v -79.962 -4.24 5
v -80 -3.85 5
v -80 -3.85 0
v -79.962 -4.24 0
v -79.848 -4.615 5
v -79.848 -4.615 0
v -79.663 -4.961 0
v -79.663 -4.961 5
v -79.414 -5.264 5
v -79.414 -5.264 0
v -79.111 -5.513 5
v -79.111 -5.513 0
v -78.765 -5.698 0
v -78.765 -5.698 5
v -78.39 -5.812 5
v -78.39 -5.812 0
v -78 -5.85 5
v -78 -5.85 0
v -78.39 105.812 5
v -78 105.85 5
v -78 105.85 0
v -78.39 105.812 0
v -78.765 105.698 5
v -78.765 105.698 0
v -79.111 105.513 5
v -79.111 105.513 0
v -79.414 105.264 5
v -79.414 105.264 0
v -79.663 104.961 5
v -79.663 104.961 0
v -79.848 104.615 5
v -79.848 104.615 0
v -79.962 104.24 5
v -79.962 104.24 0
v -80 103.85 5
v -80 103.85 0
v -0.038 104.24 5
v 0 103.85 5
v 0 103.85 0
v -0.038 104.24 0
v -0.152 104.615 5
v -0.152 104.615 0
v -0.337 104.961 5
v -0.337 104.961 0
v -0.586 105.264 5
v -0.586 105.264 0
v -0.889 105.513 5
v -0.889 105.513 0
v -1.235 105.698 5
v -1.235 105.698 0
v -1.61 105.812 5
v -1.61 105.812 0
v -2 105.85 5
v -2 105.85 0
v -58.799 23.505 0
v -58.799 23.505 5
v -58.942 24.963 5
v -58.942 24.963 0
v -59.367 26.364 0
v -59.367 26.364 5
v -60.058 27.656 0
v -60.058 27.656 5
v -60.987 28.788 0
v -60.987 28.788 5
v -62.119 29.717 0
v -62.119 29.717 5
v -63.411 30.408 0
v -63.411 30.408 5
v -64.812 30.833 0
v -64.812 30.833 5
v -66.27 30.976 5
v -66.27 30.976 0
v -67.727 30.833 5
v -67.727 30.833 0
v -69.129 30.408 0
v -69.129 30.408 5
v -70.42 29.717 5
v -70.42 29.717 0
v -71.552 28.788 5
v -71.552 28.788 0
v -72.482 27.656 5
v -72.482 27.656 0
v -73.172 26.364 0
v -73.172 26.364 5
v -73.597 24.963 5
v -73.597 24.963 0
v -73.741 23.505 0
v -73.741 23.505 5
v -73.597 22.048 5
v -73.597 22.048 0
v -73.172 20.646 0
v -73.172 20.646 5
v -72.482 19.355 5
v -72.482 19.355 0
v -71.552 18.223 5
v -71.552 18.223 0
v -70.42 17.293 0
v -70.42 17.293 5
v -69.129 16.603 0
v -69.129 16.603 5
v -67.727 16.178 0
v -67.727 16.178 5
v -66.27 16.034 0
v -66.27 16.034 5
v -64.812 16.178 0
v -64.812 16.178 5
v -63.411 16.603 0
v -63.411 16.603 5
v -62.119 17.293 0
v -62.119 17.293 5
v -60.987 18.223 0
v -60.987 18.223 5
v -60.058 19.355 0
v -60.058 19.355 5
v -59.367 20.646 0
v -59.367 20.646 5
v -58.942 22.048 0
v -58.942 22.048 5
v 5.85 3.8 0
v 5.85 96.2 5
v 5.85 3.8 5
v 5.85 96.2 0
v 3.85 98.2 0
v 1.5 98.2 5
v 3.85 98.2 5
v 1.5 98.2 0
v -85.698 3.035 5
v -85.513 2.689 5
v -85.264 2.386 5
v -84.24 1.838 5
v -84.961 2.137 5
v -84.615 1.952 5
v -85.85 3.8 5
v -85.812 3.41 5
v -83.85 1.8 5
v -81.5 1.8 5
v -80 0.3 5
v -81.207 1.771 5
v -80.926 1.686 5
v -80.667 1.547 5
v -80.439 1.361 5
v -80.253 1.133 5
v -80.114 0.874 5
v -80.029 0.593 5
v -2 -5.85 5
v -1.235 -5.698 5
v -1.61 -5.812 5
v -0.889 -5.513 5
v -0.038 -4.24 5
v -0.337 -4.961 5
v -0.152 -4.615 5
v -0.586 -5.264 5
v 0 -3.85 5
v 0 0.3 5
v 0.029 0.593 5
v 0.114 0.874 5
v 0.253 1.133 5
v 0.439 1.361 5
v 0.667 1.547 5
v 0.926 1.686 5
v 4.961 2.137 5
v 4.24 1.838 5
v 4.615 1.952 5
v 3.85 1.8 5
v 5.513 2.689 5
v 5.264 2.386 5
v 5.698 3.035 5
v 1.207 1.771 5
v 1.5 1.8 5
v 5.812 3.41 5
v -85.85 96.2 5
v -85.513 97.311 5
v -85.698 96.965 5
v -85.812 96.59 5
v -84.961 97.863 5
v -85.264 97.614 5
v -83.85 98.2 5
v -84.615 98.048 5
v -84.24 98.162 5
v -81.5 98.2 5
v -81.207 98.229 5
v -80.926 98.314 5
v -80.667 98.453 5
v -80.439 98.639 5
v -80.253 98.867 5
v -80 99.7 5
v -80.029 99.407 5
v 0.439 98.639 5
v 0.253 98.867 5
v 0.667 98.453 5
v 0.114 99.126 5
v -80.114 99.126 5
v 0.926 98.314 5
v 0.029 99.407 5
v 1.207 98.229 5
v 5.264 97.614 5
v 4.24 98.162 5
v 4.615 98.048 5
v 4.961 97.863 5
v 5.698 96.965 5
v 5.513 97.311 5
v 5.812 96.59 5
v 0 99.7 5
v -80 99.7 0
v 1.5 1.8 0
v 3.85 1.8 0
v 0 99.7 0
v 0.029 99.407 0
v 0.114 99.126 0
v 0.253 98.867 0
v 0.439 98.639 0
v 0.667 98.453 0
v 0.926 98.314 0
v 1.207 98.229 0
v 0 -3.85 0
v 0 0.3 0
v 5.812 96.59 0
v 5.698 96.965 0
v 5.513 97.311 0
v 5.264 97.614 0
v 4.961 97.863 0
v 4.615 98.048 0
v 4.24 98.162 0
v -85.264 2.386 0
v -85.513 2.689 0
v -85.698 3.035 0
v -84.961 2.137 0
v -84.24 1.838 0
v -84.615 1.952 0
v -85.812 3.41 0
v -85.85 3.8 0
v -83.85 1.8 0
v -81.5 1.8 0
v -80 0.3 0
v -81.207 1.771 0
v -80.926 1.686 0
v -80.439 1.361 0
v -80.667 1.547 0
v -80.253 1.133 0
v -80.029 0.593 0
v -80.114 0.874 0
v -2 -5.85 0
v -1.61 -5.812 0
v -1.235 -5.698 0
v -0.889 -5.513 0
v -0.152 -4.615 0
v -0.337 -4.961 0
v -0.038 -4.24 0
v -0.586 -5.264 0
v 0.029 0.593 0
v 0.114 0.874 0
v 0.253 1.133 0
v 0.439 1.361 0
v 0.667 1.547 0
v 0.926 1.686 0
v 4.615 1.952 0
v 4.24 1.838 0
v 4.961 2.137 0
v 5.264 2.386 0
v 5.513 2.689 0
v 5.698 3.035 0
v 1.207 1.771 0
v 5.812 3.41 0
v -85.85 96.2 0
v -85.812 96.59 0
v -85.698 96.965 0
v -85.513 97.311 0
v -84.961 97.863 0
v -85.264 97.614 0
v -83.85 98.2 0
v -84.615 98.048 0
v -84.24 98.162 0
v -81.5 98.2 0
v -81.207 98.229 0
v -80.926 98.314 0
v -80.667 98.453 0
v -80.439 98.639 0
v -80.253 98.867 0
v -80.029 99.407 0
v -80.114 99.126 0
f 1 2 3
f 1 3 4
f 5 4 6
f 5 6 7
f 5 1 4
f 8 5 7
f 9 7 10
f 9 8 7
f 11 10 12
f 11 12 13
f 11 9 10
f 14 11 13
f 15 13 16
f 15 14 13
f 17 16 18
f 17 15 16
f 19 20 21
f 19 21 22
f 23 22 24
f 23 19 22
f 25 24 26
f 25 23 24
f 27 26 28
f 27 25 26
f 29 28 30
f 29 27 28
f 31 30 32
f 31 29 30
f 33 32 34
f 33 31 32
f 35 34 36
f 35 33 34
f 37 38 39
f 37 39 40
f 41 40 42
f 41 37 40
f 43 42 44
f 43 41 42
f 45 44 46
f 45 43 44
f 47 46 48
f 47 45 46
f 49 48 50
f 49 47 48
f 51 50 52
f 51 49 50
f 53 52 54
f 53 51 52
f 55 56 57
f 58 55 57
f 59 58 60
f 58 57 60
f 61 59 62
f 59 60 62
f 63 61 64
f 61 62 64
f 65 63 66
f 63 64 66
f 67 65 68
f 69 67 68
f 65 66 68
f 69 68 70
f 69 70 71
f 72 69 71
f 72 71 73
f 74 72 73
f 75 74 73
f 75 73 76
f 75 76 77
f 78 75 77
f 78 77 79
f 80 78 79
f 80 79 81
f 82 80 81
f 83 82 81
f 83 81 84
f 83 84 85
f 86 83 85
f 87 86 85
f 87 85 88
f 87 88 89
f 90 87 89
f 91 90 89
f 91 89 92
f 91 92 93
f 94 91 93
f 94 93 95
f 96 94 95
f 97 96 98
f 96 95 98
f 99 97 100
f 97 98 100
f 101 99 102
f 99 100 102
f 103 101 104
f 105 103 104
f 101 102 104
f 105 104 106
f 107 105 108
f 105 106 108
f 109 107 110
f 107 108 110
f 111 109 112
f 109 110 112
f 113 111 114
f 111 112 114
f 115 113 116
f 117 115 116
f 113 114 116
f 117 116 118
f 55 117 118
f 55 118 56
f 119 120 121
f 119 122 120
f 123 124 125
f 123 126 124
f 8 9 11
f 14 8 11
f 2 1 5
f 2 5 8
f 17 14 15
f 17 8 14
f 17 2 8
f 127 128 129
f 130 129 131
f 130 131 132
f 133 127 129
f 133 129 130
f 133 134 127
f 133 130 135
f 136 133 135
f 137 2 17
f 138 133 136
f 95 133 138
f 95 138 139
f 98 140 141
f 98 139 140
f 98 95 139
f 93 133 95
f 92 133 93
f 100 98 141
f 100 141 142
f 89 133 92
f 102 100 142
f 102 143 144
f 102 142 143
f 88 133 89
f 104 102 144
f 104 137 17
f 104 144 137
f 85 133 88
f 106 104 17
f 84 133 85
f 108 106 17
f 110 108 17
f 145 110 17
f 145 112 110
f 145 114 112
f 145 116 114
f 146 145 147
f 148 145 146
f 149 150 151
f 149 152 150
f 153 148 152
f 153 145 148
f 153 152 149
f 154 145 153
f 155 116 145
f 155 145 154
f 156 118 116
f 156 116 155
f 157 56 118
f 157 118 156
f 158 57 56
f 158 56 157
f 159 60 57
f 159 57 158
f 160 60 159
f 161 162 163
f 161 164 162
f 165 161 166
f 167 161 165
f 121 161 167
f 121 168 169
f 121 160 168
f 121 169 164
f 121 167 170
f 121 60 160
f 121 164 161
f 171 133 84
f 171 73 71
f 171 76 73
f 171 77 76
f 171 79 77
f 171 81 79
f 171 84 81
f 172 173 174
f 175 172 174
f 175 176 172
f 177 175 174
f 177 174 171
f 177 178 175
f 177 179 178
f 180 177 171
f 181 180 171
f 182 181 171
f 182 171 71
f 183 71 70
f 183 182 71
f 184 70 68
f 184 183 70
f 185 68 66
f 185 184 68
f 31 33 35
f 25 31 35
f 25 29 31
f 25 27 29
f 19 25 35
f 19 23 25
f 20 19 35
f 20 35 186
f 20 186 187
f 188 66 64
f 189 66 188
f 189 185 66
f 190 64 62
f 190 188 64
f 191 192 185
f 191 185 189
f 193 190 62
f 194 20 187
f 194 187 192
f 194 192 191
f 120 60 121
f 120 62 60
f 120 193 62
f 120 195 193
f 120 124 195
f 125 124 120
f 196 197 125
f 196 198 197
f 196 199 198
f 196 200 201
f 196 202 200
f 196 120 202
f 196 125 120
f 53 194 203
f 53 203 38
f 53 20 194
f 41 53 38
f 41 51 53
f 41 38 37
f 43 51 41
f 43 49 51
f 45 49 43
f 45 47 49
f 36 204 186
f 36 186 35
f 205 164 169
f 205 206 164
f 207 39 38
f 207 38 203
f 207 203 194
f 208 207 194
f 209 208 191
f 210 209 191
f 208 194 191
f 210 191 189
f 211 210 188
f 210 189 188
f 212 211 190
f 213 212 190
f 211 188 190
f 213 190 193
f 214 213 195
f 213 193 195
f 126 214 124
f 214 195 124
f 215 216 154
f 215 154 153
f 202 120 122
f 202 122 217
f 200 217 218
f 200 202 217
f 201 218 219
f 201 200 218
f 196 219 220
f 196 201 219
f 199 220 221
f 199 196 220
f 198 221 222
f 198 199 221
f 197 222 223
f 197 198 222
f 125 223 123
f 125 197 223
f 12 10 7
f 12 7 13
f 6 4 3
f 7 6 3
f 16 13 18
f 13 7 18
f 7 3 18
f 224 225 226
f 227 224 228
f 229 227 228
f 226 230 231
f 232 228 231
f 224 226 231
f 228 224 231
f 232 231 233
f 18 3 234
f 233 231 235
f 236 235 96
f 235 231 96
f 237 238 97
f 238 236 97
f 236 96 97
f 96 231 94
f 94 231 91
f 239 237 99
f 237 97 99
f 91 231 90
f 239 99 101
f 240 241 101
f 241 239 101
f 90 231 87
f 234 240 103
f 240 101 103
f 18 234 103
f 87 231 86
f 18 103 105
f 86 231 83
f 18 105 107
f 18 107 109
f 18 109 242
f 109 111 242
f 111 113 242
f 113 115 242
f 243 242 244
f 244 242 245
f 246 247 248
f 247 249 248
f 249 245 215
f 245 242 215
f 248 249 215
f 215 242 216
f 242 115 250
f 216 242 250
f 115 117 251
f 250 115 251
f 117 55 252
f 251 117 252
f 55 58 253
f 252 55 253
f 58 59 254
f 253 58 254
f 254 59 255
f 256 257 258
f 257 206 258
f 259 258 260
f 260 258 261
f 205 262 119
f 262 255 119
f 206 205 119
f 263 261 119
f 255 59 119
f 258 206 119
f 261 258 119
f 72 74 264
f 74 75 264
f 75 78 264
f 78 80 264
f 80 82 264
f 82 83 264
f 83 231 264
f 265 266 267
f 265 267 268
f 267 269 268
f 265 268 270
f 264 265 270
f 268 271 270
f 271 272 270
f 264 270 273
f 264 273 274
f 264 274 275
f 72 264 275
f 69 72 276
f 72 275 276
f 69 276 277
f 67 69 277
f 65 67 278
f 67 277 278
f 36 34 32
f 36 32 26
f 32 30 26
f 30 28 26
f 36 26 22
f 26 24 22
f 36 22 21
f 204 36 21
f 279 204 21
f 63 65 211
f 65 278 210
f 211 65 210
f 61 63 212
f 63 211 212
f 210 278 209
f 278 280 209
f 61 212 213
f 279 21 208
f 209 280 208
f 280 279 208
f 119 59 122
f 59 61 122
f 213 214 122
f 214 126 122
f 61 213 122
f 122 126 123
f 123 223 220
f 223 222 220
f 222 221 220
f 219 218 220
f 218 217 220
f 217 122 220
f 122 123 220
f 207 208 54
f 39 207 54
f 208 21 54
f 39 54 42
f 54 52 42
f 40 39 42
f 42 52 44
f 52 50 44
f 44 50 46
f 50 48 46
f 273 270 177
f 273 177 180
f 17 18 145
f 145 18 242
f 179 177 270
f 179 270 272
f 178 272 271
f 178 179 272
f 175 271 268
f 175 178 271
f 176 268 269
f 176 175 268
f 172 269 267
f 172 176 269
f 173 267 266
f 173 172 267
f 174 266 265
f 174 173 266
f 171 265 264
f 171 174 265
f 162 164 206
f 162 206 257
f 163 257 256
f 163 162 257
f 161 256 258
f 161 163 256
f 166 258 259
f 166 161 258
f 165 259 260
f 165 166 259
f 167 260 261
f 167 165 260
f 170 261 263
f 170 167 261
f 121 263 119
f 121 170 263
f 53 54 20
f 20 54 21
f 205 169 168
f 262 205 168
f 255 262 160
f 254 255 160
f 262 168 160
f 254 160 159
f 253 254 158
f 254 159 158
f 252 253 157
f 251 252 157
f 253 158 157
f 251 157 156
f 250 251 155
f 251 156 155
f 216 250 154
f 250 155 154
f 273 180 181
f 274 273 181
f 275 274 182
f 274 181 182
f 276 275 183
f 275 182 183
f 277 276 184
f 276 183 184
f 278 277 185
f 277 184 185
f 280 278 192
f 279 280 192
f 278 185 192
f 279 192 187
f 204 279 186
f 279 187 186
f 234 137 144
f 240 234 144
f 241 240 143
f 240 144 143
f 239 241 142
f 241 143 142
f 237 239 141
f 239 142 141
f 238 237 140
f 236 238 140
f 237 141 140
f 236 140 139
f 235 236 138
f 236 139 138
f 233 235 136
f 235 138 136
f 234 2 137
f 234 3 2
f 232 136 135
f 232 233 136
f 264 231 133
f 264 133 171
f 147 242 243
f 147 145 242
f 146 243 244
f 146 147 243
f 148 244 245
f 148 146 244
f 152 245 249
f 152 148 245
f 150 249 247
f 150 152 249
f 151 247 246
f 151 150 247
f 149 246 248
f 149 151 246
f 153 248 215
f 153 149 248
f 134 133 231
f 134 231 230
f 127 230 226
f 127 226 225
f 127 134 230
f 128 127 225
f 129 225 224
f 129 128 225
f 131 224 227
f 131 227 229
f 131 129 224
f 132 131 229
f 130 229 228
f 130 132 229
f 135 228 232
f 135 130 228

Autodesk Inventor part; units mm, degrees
ref_plane "YZ Plane" through (0, 0, 0) normal (1, 0, 0) x (0, 1, 0)
ref_plane "XZ Plane" through (0, 0, 0) normal (0, 1, 0) x (-1, 0, 0)
ref_plane "XY Plane" through (0, 0, 0) normal (0, 0, 1) x (1, 0, 0)
sketch "Skizze3" plane through (0, 0, 0) normal (0, 0, 1) x (1, 0, 0)
  line L0 (0, 0) -> (-80, 0)
  line L1 (-80, 0) -> (-80, 100)
  line L2 (-80, 100) -> (0, 100)
  line L3 (0, 100) -> (0, 0)
  line L4 (-80, 100) -> (0, 100)
  line L5 (-40, 105.85) -> (-80, 105.85)
  line L6 (-80, 105.85) -> (-80, 100)
  line L7 (-80, 50) -> (-85.85, 50)
  line L8 (-85.85, 50) -> (-85.85, 98.2)
  line L9 (-85.85, 98.2) -> (-80, 98.2)
  line L10 (-80, 98.2) -> (-80, 50)
  line L11 (-40, 105.85) -> (-40, 100)
  dimension "d4" = 100
  dimension "d5" = 80
  dimension "d6" = 5.85
  dimension "d7" = 5.85
  dimension "d8" = 1.8
extrude "Extrusion3" add sketch "Skizze3" along normal blind 5 contours L0 L1 L2 L3
extrude "Extrusion4" add sketch "Skizze3" along normal blind 5 contours L7 L8 L9 L1 | L2 L6 L5 L11
fillet "Rundung1" radius 2 2 edges at (-85.85, 98.2, 2.5) (-80, 105.85, 2.5)
mirror "Spiegeln1" about plane through (-85.85, 50, 0) normal (0, -1, 0) of "Extrusion4", "Rundung1"
mirror "Spiegeln2" about plane through (-40, 0, 0) normal (1, 0, 0) of "Extrusion4", "Rundung1", "Spiegeln1"
fillet "Rundung2" radius 1.5 4 edges at (-80, 98.2, 2.5) (-80, 1.8, 2.5) (0, 1.8, 2.5) (0, 98.2, 2.5)
sketch "Skizze4" plane through (0, 0, 5) normal (0, 0, 1) x (1, 0, 0)
  circle A0 centre (-66.2696, 23.5053) radius 7.471
  point P0 (0, 0)
  point P1 (-74.5257, 11.4963)
  point P2 (-75.2763, 39.7173)
  point P3 (-61.9163, 37.7659)
  point P4 (-59.3644, 15.2491)
extrude "Extrusion5" cut sketch "Skizze4" against normal blind 10
equation "\"d7\" = d6"
properties part number "BT701_trajan20_21" material "Acryl"
